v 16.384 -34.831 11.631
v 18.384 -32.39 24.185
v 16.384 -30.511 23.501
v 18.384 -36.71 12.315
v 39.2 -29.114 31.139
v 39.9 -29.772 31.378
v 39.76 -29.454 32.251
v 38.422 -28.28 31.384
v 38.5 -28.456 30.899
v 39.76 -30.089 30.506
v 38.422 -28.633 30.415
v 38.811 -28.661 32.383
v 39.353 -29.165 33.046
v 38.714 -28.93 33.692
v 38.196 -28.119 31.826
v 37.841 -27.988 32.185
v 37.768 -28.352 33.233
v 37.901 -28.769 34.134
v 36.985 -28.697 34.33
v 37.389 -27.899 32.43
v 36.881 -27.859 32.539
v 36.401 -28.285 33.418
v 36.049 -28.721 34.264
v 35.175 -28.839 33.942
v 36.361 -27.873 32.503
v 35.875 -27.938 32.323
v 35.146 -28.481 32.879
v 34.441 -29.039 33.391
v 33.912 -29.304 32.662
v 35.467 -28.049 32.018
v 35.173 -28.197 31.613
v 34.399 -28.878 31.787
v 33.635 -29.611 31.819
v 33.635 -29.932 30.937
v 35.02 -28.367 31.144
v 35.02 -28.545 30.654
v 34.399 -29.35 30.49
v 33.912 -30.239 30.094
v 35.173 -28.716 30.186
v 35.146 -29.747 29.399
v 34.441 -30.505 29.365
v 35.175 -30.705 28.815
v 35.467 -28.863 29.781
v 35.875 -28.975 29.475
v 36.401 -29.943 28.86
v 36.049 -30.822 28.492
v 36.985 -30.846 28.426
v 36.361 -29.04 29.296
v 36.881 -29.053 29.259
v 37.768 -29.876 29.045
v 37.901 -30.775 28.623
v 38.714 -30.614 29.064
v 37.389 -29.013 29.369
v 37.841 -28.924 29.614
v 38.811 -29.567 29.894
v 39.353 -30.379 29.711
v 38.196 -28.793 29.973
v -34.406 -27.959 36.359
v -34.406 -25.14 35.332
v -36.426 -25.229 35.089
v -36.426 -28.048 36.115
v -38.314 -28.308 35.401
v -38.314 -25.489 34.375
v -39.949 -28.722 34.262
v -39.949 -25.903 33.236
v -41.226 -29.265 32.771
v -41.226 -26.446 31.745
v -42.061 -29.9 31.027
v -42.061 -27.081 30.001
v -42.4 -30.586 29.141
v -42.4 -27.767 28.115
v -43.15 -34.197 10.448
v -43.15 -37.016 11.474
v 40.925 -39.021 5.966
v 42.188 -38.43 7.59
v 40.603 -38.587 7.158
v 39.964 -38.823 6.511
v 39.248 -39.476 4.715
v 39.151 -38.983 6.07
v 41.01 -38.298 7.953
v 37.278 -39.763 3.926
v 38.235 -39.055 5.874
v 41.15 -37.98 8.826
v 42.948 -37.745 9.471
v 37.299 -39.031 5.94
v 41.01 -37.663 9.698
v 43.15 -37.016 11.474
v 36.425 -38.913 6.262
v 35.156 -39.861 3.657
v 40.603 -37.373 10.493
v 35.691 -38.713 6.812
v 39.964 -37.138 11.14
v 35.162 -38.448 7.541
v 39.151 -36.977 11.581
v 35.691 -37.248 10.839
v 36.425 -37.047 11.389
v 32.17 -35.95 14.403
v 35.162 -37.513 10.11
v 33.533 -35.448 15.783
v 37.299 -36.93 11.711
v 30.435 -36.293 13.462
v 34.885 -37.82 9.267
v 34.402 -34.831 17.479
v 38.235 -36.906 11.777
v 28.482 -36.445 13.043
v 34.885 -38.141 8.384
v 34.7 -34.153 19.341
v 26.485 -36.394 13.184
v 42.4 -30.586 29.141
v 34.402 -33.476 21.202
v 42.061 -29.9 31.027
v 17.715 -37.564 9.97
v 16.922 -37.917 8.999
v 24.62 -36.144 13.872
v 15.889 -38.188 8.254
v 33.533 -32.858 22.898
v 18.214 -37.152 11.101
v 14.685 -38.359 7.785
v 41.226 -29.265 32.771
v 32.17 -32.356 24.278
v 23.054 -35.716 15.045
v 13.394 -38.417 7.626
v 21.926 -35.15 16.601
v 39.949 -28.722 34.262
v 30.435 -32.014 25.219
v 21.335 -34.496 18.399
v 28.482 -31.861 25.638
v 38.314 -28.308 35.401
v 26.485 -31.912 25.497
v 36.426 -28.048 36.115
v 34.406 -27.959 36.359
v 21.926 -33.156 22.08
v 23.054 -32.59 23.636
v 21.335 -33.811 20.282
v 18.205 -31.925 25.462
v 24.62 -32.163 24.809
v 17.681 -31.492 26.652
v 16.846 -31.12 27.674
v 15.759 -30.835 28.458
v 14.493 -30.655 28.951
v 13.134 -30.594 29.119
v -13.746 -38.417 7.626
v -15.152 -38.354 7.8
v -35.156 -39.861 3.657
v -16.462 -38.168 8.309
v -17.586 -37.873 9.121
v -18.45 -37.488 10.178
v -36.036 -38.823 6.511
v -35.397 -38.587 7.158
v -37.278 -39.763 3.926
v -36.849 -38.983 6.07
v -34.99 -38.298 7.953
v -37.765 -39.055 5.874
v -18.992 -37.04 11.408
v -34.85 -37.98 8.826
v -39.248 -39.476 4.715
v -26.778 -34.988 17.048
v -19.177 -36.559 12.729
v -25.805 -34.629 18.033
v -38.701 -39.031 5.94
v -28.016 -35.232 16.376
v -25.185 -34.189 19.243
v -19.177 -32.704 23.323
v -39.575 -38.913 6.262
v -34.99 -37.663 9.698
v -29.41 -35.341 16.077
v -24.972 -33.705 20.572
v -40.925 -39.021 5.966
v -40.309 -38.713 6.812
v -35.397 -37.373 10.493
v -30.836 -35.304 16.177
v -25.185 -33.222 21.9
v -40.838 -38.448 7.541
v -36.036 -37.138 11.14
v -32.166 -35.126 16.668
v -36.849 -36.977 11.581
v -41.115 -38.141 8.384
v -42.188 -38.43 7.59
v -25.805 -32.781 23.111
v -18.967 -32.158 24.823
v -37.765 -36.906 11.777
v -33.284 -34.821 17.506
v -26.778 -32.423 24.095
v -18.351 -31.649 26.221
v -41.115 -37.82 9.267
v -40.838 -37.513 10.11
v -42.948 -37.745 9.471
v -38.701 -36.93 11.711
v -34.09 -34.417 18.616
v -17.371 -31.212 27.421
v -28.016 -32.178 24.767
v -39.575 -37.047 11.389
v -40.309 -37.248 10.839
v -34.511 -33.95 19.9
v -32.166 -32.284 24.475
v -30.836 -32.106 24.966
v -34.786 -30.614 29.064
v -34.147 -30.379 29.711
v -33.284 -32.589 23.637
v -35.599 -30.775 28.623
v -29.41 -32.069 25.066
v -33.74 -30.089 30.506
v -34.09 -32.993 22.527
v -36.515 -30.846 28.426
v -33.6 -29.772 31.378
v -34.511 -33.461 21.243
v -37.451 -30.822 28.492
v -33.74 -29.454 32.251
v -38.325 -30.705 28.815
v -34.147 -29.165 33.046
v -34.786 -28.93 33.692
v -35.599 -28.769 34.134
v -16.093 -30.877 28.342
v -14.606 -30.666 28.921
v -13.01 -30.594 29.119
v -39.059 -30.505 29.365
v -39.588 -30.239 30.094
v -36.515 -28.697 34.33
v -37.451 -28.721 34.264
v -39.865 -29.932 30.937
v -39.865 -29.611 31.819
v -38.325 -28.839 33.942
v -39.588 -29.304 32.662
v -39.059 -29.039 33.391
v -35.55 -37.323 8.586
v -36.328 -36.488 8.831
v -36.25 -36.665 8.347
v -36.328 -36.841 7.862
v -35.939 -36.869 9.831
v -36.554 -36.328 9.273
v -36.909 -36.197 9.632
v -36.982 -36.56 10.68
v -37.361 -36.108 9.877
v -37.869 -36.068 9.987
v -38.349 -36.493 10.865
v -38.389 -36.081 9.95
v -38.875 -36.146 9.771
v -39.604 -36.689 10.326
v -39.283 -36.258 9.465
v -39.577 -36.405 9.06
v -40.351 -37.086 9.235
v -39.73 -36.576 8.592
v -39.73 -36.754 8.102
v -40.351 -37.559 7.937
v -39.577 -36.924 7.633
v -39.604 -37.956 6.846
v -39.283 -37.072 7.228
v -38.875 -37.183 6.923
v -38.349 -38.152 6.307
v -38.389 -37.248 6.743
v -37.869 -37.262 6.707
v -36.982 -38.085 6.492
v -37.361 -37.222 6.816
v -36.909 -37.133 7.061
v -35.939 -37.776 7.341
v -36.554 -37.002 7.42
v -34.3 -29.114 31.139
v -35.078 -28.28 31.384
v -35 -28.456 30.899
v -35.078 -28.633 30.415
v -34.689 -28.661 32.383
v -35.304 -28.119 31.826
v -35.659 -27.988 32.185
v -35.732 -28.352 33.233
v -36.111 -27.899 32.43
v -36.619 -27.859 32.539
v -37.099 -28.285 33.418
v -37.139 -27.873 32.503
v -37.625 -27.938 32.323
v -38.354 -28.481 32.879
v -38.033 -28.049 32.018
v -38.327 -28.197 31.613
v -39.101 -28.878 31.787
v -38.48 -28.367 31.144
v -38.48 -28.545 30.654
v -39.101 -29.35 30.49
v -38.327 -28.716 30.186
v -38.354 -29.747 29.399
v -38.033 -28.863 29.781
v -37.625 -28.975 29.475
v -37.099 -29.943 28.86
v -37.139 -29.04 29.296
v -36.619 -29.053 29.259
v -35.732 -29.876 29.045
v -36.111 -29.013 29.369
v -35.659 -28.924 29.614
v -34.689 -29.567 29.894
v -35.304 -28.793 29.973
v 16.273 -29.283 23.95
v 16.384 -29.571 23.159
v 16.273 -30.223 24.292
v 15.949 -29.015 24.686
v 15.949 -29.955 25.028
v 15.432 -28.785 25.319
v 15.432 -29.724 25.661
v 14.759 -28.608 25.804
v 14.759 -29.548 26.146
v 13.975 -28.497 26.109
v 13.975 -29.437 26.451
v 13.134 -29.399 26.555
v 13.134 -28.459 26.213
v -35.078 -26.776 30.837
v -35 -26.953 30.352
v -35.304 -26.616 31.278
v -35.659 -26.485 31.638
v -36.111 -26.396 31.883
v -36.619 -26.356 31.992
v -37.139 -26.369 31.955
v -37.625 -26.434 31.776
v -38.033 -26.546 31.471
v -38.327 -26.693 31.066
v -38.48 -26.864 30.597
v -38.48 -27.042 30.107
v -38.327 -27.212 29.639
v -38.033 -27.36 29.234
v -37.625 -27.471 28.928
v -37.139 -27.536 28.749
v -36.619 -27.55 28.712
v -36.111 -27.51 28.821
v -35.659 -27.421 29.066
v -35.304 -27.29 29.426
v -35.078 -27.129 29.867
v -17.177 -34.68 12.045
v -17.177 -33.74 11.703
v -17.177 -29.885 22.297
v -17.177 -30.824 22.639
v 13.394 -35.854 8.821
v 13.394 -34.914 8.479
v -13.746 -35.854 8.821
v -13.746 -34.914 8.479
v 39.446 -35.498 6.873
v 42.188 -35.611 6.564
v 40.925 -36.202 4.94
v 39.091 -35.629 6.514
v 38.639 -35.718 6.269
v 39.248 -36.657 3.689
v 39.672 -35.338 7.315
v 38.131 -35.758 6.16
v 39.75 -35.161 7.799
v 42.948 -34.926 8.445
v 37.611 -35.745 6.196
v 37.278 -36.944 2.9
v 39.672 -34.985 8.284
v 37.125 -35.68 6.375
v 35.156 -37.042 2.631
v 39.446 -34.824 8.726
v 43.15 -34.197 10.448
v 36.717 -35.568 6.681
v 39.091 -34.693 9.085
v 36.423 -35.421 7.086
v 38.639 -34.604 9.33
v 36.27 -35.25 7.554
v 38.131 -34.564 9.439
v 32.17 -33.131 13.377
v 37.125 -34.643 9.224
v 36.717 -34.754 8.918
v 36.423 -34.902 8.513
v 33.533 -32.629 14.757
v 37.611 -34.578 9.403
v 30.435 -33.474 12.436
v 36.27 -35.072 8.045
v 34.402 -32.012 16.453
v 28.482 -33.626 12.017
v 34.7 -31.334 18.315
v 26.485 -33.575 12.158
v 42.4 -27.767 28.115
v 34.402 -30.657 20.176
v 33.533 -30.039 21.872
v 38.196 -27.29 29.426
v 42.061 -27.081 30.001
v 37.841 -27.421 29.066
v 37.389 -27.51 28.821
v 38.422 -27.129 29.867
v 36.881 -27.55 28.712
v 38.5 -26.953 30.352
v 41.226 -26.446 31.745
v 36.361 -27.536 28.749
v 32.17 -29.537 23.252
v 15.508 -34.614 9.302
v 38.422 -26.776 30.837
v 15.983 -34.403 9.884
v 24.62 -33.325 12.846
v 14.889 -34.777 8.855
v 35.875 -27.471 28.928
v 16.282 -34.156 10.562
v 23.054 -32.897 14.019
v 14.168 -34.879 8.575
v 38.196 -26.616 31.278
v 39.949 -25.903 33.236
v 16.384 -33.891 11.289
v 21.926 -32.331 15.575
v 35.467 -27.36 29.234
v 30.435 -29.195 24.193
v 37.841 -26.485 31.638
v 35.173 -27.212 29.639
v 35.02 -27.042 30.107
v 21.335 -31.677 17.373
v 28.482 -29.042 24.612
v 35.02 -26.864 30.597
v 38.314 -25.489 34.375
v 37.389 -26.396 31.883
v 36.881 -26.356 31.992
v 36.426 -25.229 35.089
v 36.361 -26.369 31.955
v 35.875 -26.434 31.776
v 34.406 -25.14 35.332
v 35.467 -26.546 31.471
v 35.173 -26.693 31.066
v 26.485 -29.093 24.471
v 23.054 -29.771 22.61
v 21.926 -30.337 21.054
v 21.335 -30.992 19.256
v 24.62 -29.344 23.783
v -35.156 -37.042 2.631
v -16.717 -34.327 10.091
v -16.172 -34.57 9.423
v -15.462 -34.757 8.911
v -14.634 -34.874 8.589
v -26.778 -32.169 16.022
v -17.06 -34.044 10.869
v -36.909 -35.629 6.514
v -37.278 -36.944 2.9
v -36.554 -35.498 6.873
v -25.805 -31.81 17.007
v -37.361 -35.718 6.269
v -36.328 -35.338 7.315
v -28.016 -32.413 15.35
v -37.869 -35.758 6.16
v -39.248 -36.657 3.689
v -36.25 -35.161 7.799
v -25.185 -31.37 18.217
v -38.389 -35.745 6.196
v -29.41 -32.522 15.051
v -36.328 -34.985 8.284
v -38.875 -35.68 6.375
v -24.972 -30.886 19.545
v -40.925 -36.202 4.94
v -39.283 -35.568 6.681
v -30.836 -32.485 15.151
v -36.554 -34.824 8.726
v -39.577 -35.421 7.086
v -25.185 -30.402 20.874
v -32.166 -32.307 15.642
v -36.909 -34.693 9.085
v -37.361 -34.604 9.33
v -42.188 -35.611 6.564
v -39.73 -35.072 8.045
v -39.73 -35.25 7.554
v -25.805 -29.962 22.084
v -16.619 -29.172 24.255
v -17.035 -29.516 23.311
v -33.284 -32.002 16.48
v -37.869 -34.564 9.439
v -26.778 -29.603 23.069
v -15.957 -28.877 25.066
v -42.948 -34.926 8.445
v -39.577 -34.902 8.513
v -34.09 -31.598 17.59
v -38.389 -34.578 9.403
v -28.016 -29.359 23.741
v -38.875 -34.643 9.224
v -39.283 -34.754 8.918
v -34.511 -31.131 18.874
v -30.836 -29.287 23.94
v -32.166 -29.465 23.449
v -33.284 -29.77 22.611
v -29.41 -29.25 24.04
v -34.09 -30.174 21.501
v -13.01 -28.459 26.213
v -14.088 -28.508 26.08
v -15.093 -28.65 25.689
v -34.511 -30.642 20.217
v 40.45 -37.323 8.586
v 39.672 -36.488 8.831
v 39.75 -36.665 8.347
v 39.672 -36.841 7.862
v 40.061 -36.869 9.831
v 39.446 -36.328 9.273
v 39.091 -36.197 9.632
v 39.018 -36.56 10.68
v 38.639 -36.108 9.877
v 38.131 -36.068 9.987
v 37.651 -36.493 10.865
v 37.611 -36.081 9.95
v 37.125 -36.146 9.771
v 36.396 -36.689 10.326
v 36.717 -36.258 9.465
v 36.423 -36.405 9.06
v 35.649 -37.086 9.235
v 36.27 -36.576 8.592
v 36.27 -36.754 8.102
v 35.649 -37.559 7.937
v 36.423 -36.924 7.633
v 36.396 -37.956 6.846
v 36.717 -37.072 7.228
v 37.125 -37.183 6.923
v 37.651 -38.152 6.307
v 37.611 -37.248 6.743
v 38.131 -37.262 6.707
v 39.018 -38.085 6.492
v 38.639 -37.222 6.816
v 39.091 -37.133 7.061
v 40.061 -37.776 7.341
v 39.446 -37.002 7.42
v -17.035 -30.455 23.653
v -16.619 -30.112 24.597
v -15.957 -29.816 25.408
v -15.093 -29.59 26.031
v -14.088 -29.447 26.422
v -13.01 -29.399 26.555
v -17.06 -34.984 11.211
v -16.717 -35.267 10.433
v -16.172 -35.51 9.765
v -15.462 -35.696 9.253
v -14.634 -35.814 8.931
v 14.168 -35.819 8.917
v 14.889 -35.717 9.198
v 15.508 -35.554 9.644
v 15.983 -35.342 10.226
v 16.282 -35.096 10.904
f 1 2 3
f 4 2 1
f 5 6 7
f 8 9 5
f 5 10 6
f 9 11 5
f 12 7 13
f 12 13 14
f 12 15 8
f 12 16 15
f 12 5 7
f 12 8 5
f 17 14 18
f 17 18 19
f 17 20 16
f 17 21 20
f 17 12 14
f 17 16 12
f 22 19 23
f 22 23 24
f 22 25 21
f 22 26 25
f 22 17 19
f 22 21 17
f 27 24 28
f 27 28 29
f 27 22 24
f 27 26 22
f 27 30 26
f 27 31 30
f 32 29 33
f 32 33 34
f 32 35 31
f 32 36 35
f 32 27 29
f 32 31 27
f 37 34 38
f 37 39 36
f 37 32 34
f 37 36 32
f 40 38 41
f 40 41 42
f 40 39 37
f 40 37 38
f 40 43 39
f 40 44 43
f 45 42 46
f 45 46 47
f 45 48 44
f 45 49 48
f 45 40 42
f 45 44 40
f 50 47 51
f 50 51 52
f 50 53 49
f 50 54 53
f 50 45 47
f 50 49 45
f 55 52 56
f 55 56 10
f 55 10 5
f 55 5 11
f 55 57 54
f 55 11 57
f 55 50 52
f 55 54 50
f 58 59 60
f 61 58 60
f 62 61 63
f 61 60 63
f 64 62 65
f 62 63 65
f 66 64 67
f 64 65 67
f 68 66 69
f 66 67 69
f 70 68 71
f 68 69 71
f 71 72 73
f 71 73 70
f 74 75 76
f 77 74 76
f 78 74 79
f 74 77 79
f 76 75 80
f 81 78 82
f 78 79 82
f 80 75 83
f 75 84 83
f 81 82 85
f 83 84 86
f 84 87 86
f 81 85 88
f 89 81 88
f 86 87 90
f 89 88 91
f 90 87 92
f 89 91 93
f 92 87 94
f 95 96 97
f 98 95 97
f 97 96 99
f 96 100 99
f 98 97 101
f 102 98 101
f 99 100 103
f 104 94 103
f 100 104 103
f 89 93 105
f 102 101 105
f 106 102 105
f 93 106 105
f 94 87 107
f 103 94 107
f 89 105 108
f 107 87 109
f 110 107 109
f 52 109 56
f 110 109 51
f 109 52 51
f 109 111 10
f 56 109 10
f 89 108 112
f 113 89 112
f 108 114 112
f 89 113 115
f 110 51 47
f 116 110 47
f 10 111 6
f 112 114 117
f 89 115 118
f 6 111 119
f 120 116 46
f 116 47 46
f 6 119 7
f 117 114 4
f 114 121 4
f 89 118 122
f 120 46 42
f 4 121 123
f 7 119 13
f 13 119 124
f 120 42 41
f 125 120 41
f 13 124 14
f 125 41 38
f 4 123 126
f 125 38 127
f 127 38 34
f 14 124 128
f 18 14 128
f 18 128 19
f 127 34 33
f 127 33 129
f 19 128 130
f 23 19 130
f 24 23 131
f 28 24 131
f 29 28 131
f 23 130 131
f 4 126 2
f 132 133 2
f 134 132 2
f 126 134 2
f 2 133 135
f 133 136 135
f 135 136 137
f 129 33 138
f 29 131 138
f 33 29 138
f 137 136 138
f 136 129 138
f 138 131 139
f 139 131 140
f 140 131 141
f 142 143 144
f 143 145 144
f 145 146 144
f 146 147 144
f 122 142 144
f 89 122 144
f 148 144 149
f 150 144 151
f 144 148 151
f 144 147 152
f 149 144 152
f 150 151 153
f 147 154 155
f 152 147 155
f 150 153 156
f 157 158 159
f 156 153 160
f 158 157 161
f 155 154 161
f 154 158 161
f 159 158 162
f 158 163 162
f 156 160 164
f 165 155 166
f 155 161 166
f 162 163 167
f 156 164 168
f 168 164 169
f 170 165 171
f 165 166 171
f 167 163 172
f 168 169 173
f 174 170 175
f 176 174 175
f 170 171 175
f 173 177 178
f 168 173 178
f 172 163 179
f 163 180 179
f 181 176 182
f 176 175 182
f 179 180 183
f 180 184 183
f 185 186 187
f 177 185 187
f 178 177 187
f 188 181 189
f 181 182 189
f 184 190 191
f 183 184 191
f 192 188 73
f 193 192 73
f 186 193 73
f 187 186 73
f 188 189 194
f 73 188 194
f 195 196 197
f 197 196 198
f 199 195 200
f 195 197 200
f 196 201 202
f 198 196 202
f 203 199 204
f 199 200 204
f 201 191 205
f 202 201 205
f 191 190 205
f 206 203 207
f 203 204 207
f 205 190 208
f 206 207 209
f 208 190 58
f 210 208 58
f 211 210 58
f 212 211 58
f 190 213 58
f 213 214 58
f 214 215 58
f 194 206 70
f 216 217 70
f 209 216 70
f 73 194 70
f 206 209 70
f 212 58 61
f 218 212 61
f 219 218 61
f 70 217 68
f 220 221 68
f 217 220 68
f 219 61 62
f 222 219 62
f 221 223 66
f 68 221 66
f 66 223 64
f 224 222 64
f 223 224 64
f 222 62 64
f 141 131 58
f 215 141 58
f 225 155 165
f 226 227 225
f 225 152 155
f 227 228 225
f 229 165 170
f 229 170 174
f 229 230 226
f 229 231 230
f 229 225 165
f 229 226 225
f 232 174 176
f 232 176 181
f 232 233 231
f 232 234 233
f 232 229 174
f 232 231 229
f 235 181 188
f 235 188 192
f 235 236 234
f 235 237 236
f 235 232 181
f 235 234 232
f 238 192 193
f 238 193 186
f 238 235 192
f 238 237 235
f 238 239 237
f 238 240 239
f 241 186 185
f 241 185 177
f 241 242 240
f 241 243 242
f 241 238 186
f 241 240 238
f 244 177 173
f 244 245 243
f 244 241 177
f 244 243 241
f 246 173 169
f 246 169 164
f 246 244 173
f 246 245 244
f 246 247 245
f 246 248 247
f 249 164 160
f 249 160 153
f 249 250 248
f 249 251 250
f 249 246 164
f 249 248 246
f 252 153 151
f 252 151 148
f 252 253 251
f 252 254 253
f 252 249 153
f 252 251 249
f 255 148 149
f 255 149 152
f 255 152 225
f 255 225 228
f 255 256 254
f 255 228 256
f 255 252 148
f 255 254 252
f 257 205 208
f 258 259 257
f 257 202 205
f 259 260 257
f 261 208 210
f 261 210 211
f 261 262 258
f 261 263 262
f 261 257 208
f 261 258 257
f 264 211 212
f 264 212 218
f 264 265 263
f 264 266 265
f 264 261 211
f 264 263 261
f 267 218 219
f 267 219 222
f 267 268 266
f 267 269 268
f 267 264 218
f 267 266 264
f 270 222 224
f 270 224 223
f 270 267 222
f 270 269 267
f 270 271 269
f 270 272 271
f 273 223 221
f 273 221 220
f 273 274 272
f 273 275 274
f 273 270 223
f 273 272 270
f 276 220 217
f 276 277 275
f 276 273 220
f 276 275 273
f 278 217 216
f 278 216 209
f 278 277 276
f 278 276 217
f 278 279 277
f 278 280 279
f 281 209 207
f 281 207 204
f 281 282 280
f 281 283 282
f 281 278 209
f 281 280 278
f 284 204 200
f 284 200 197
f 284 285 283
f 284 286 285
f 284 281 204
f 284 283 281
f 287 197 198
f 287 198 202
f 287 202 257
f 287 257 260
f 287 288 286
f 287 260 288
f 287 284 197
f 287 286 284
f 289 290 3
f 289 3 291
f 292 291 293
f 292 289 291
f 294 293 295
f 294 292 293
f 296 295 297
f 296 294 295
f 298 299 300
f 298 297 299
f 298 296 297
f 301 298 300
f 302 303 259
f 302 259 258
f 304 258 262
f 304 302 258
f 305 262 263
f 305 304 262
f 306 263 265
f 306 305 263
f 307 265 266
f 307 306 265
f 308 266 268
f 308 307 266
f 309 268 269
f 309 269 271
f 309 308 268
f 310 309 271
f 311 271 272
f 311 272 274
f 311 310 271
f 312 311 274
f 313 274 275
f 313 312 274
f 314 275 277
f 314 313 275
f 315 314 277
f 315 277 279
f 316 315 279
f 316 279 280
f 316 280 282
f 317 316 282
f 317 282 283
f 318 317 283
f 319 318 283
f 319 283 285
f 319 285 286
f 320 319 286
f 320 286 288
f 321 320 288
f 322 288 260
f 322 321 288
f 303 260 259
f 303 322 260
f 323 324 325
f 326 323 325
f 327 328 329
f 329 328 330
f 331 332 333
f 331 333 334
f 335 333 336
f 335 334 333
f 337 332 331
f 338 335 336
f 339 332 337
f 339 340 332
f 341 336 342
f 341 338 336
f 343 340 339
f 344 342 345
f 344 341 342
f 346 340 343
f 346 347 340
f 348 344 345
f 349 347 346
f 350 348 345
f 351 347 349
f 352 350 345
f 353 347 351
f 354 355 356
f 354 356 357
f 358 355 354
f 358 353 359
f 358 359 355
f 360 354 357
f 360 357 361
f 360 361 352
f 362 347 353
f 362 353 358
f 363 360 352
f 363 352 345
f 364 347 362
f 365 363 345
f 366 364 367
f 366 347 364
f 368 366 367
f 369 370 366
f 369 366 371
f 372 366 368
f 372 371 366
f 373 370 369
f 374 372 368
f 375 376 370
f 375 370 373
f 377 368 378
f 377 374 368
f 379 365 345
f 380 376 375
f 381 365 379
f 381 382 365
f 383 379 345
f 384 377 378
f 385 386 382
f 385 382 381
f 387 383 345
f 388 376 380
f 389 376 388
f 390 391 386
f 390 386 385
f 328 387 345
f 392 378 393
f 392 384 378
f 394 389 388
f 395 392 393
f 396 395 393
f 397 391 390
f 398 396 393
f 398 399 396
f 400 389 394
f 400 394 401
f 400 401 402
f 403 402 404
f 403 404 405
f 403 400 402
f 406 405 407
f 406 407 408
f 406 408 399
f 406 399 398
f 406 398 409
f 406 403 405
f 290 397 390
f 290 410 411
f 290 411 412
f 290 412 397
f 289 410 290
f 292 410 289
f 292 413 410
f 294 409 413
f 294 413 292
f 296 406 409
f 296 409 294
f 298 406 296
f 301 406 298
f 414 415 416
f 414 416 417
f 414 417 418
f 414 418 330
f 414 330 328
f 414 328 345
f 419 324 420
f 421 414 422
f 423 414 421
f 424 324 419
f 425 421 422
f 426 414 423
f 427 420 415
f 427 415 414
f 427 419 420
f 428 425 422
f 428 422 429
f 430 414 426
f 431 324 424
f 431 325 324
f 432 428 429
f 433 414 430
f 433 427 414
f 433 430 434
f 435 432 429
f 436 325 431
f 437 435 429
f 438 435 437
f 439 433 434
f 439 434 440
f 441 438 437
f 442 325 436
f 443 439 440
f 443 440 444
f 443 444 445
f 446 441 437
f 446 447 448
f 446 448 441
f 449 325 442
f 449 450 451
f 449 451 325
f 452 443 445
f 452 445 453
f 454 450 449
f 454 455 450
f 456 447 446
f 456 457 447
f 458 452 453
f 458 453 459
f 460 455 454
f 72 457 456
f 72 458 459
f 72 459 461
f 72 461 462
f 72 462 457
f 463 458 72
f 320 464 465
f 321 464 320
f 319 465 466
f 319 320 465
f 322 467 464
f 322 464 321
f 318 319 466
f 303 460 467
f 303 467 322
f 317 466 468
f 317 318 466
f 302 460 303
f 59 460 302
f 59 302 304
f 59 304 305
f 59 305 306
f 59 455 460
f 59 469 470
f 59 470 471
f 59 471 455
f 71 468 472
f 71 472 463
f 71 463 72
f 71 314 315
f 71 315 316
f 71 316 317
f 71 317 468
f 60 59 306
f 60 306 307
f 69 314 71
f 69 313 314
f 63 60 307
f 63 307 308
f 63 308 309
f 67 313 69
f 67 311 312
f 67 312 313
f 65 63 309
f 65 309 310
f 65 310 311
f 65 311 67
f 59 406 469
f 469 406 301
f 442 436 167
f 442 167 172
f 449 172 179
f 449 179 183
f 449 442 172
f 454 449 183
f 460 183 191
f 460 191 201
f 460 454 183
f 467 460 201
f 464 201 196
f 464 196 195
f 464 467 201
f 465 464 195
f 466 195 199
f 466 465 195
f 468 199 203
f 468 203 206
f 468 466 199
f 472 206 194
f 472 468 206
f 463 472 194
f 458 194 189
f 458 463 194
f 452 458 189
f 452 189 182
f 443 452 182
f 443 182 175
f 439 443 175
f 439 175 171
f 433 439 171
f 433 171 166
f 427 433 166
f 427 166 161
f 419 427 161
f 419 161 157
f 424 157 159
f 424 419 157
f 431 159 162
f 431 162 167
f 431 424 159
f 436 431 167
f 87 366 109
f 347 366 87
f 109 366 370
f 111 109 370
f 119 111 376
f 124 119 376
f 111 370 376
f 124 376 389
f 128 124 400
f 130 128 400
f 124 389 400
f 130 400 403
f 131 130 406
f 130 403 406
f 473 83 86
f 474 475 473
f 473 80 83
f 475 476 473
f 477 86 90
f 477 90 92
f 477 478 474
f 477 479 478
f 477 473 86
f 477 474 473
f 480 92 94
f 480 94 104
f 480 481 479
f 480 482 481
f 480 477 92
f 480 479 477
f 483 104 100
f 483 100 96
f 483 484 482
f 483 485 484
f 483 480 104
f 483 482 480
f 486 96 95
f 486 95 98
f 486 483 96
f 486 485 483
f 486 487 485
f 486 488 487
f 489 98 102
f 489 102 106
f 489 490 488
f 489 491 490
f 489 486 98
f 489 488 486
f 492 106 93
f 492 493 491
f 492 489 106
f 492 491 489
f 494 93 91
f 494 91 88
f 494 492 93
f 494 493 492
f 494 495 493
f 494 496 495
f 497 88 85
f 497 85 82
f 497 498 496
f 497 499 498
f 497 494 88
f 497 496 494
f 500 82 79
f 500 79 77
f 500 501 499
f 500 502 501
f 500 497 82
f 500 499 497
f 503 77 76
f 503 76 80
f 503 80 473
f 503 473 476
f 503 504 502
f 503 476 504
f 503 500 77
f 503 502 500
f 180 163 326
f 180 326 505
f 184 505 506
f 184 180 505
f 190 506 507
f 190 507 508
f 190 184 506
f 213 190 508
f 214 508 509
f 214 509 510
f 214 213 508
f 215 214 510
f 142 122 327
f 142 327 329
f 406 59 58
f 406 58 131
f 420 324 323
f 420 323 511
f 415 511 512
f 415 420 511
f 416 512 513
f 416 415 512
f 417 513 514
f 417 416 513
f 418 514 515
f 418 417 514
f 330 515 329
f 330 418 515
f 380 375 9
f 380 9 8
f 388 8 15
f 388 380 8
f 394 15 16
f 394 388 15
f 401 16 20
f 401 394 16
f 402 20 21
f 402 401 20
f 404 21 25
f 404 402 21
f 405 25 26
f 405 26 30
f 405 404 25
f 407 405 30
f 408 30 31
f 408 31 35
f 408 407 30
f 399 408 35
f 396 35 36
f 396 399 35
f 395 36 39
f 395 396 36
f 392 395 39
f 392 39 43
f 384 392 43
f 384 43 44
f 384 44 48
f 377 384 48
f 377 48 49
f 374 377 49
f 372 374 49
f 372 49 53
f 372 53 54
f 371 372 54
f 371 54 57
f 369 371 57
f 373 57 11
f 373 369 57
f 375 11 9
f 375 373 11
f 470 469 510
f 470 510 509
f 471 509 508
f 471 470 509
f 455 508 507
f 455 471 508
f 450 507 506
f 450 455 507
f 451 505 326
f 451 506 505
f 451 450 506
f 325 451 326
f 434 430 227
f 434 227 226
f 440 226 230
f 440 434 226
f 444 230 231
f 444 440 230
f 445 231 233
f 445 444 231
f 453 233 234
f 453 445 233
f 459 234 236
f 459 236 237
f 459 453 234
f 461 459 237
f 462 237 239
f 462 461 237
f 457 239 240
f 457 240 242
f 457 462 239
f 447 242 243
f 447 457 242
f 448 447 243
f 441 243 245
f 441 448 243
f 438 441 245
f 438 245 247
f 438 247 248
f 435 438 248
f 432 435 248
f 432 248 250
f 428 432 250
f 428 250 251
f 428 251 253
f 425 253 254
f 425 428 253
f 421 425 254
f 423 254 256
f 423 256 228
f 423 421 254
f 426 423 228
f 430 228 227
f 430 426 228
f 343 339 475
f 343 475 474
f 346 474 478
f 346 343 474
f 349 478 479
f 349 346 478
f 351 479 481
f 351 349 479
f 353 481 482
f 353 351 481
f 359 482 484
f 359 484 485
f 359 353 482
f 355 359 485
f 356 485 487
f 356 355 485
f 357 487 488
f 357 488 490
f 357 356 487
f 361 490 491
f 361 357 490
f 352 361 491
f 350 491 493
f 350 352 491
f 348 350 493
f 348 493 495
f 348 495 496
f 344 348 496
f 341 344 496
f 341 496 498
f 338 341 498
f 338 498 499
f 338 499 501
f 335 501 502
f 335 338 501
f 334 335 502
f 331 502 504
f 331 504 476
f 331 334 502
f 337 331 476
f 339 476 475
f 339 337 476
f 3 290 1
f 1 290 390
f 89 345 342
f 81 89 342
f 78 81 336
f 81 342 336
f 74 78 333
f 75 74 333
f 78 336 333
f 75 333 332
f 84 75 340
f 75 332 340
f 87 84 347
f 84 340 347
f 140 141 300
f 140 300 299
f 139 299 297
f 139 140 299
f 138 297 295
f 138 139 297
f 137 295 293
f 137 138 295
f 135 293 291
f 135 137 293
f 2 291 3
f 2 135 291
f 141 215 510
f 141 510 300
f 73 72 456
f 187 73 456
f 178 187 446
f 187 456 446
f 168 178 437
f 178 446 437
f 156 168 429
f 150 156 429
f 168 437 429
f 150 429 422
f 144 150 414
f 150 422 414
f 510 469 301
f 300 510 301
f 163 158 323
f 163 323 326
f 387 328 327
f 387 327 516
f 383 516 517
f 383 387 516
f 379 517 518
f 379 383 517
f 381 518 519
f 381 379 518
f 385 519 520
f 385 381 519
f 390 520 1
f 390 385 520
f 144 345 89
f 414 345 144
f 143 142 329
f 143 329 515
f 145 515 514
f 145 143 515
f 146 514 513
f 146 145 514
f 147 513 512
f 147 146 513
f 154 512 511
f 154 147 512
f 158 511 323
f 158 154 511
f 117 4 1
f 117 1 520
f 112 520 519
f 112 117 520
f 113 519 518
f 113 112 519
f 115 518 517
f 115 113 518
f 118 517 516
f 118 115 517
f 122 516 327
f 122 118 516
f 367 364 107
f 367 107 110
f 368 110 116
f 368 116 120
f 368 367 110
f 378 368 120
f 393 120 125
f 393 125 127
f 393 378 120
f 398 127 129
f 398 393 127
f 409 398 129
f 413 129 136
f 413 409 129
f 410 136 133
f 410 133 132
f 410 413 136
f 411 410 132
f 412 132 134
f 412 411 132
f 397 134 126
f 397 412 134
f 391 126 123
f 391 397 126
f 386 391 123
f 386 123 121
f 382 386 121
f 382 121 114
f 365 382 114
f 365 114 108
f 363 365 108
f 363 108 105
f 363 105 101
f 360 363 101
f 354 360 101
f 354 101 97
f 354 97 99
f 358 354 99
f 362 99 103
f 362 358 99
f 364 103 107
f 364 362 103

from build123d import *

# Parameters (mm, degrees)
SKETCH033_R     = 1.75
SKETCH033_R_2   = 4.796418
SKETCH033_R_3   = 6.720156
PAD001_DEPTH    = 3
CHAMFER001_SIZE = 2
CHAMFER002_SIZE = 1.4


with BuildPart() as part:
    # Sketch033 → Pad001 (new body)
    with BuildSketch(Plane(origin=(0, -38, 0), x_dir=(1, 0, 0), z_dir=(0, -0.939693, 0.34202))):
        with BuildLine():
            Line((-34.406356, 37.6), (34.406361, 37.6))
            ThreePointArc((42.400003, 29.918894), (39.949322, 35.368499), (34.406361, 37.6))
            Line((42.400003, 29.918894), (43.15, 11.118894))
            ThreePointArc((35.156359, 2.8), (40.924857, 5.257038), (43.15, 11.118894))
            Line((35.156359, 2.8), (-35.156359, 2.8))
            ThreePointArc((-43.15, 11.118896), (-40.924858, 5.257039), (-35.156359, 2.8))
            Line((-43.15, 11.118896), (-42.399997, 29.918896))
            ThreePointArc((-34.406356, 37.6), (-39.949317, 35.368499), (-42.399997, 29.918896))
        make_face()
        with Locations((-36.75, 32.3)):
            Circle(SKETCH033_R, mode=Mode.SUBTRACT)
        with Locations((36.75, 32.3)):
            Circle(SKETCH033_R, mode=Mode.SUBTRACT)
        with Locations((-38, 8.3)):
            Circle(SKETCH033_R, mode=Mode.SUBTRACT)
        with Locations((38, 8.3)):
            Circle(SKETCH033_R, mode=Mode.SUBTRACT)
        with Locations((-29.768274, 20.799871)):
            Circle(SKETCH033_R_2, mode=Mode.SUBTRACT)
        with Locations((27.980227, 19.489883)):
            Circle(SKETCH033_R_3, mode=Mode.SUBTRACT)
        with BuildLine():
            Line((-13.009558, 27.89562), (13.133726, 27.89562))
            ThreePointArc((16.384062, 24.645284), (15.43206, 26.943619), (13.133726, 27.89562))
            Line((16.384062, 24.645284), (16.384062, 12.013562))
            ThreePointArc((13.393686, 9.023187), (15.508201, 9.899048), (16.384062, 12.013562))
            Line((13.393686, 9.023187), (-13.746031, 9.023187))
            ThreePointArc((-17.177177, 12.454333), (-16.172218, 10.028147), (-13.746031, 9.023187))
            Line((-17.177177, 12.454333), (-17.177177, 23.728001))
            ThreePointArc((-13.009558, 27.89562), (-15.95651, 26.674953), (-17.177177, 23.728001))
        make_face(mode=Mode.SUBTRACT)
    extrude(amount=PAD001_DEPTH)

    # Chamfer001
    chamfer001_edges = [part.edges().sort_by_distance(p)[0] for p in [
        (0.062084, -31.278214, 27.239369),
    ]]
    chamfer(chamfer001_edges, length=CHAMFER001_SIZE)

    # Chamfer002
    chamfer002_edges = [part.edges().sort_by_distance(p)[0] for p in [
        (-38.5, -29.771827, 31.378132),
        (-39.75, -37.980311, 8.825509),
        (35, -29.771827, 31.378132),
        (36.25, -37.980311, 8.825509),
    ]]
    chamfer(chamfer002_edges, length=CHAMFER002_SIZE)


solid = part.part
